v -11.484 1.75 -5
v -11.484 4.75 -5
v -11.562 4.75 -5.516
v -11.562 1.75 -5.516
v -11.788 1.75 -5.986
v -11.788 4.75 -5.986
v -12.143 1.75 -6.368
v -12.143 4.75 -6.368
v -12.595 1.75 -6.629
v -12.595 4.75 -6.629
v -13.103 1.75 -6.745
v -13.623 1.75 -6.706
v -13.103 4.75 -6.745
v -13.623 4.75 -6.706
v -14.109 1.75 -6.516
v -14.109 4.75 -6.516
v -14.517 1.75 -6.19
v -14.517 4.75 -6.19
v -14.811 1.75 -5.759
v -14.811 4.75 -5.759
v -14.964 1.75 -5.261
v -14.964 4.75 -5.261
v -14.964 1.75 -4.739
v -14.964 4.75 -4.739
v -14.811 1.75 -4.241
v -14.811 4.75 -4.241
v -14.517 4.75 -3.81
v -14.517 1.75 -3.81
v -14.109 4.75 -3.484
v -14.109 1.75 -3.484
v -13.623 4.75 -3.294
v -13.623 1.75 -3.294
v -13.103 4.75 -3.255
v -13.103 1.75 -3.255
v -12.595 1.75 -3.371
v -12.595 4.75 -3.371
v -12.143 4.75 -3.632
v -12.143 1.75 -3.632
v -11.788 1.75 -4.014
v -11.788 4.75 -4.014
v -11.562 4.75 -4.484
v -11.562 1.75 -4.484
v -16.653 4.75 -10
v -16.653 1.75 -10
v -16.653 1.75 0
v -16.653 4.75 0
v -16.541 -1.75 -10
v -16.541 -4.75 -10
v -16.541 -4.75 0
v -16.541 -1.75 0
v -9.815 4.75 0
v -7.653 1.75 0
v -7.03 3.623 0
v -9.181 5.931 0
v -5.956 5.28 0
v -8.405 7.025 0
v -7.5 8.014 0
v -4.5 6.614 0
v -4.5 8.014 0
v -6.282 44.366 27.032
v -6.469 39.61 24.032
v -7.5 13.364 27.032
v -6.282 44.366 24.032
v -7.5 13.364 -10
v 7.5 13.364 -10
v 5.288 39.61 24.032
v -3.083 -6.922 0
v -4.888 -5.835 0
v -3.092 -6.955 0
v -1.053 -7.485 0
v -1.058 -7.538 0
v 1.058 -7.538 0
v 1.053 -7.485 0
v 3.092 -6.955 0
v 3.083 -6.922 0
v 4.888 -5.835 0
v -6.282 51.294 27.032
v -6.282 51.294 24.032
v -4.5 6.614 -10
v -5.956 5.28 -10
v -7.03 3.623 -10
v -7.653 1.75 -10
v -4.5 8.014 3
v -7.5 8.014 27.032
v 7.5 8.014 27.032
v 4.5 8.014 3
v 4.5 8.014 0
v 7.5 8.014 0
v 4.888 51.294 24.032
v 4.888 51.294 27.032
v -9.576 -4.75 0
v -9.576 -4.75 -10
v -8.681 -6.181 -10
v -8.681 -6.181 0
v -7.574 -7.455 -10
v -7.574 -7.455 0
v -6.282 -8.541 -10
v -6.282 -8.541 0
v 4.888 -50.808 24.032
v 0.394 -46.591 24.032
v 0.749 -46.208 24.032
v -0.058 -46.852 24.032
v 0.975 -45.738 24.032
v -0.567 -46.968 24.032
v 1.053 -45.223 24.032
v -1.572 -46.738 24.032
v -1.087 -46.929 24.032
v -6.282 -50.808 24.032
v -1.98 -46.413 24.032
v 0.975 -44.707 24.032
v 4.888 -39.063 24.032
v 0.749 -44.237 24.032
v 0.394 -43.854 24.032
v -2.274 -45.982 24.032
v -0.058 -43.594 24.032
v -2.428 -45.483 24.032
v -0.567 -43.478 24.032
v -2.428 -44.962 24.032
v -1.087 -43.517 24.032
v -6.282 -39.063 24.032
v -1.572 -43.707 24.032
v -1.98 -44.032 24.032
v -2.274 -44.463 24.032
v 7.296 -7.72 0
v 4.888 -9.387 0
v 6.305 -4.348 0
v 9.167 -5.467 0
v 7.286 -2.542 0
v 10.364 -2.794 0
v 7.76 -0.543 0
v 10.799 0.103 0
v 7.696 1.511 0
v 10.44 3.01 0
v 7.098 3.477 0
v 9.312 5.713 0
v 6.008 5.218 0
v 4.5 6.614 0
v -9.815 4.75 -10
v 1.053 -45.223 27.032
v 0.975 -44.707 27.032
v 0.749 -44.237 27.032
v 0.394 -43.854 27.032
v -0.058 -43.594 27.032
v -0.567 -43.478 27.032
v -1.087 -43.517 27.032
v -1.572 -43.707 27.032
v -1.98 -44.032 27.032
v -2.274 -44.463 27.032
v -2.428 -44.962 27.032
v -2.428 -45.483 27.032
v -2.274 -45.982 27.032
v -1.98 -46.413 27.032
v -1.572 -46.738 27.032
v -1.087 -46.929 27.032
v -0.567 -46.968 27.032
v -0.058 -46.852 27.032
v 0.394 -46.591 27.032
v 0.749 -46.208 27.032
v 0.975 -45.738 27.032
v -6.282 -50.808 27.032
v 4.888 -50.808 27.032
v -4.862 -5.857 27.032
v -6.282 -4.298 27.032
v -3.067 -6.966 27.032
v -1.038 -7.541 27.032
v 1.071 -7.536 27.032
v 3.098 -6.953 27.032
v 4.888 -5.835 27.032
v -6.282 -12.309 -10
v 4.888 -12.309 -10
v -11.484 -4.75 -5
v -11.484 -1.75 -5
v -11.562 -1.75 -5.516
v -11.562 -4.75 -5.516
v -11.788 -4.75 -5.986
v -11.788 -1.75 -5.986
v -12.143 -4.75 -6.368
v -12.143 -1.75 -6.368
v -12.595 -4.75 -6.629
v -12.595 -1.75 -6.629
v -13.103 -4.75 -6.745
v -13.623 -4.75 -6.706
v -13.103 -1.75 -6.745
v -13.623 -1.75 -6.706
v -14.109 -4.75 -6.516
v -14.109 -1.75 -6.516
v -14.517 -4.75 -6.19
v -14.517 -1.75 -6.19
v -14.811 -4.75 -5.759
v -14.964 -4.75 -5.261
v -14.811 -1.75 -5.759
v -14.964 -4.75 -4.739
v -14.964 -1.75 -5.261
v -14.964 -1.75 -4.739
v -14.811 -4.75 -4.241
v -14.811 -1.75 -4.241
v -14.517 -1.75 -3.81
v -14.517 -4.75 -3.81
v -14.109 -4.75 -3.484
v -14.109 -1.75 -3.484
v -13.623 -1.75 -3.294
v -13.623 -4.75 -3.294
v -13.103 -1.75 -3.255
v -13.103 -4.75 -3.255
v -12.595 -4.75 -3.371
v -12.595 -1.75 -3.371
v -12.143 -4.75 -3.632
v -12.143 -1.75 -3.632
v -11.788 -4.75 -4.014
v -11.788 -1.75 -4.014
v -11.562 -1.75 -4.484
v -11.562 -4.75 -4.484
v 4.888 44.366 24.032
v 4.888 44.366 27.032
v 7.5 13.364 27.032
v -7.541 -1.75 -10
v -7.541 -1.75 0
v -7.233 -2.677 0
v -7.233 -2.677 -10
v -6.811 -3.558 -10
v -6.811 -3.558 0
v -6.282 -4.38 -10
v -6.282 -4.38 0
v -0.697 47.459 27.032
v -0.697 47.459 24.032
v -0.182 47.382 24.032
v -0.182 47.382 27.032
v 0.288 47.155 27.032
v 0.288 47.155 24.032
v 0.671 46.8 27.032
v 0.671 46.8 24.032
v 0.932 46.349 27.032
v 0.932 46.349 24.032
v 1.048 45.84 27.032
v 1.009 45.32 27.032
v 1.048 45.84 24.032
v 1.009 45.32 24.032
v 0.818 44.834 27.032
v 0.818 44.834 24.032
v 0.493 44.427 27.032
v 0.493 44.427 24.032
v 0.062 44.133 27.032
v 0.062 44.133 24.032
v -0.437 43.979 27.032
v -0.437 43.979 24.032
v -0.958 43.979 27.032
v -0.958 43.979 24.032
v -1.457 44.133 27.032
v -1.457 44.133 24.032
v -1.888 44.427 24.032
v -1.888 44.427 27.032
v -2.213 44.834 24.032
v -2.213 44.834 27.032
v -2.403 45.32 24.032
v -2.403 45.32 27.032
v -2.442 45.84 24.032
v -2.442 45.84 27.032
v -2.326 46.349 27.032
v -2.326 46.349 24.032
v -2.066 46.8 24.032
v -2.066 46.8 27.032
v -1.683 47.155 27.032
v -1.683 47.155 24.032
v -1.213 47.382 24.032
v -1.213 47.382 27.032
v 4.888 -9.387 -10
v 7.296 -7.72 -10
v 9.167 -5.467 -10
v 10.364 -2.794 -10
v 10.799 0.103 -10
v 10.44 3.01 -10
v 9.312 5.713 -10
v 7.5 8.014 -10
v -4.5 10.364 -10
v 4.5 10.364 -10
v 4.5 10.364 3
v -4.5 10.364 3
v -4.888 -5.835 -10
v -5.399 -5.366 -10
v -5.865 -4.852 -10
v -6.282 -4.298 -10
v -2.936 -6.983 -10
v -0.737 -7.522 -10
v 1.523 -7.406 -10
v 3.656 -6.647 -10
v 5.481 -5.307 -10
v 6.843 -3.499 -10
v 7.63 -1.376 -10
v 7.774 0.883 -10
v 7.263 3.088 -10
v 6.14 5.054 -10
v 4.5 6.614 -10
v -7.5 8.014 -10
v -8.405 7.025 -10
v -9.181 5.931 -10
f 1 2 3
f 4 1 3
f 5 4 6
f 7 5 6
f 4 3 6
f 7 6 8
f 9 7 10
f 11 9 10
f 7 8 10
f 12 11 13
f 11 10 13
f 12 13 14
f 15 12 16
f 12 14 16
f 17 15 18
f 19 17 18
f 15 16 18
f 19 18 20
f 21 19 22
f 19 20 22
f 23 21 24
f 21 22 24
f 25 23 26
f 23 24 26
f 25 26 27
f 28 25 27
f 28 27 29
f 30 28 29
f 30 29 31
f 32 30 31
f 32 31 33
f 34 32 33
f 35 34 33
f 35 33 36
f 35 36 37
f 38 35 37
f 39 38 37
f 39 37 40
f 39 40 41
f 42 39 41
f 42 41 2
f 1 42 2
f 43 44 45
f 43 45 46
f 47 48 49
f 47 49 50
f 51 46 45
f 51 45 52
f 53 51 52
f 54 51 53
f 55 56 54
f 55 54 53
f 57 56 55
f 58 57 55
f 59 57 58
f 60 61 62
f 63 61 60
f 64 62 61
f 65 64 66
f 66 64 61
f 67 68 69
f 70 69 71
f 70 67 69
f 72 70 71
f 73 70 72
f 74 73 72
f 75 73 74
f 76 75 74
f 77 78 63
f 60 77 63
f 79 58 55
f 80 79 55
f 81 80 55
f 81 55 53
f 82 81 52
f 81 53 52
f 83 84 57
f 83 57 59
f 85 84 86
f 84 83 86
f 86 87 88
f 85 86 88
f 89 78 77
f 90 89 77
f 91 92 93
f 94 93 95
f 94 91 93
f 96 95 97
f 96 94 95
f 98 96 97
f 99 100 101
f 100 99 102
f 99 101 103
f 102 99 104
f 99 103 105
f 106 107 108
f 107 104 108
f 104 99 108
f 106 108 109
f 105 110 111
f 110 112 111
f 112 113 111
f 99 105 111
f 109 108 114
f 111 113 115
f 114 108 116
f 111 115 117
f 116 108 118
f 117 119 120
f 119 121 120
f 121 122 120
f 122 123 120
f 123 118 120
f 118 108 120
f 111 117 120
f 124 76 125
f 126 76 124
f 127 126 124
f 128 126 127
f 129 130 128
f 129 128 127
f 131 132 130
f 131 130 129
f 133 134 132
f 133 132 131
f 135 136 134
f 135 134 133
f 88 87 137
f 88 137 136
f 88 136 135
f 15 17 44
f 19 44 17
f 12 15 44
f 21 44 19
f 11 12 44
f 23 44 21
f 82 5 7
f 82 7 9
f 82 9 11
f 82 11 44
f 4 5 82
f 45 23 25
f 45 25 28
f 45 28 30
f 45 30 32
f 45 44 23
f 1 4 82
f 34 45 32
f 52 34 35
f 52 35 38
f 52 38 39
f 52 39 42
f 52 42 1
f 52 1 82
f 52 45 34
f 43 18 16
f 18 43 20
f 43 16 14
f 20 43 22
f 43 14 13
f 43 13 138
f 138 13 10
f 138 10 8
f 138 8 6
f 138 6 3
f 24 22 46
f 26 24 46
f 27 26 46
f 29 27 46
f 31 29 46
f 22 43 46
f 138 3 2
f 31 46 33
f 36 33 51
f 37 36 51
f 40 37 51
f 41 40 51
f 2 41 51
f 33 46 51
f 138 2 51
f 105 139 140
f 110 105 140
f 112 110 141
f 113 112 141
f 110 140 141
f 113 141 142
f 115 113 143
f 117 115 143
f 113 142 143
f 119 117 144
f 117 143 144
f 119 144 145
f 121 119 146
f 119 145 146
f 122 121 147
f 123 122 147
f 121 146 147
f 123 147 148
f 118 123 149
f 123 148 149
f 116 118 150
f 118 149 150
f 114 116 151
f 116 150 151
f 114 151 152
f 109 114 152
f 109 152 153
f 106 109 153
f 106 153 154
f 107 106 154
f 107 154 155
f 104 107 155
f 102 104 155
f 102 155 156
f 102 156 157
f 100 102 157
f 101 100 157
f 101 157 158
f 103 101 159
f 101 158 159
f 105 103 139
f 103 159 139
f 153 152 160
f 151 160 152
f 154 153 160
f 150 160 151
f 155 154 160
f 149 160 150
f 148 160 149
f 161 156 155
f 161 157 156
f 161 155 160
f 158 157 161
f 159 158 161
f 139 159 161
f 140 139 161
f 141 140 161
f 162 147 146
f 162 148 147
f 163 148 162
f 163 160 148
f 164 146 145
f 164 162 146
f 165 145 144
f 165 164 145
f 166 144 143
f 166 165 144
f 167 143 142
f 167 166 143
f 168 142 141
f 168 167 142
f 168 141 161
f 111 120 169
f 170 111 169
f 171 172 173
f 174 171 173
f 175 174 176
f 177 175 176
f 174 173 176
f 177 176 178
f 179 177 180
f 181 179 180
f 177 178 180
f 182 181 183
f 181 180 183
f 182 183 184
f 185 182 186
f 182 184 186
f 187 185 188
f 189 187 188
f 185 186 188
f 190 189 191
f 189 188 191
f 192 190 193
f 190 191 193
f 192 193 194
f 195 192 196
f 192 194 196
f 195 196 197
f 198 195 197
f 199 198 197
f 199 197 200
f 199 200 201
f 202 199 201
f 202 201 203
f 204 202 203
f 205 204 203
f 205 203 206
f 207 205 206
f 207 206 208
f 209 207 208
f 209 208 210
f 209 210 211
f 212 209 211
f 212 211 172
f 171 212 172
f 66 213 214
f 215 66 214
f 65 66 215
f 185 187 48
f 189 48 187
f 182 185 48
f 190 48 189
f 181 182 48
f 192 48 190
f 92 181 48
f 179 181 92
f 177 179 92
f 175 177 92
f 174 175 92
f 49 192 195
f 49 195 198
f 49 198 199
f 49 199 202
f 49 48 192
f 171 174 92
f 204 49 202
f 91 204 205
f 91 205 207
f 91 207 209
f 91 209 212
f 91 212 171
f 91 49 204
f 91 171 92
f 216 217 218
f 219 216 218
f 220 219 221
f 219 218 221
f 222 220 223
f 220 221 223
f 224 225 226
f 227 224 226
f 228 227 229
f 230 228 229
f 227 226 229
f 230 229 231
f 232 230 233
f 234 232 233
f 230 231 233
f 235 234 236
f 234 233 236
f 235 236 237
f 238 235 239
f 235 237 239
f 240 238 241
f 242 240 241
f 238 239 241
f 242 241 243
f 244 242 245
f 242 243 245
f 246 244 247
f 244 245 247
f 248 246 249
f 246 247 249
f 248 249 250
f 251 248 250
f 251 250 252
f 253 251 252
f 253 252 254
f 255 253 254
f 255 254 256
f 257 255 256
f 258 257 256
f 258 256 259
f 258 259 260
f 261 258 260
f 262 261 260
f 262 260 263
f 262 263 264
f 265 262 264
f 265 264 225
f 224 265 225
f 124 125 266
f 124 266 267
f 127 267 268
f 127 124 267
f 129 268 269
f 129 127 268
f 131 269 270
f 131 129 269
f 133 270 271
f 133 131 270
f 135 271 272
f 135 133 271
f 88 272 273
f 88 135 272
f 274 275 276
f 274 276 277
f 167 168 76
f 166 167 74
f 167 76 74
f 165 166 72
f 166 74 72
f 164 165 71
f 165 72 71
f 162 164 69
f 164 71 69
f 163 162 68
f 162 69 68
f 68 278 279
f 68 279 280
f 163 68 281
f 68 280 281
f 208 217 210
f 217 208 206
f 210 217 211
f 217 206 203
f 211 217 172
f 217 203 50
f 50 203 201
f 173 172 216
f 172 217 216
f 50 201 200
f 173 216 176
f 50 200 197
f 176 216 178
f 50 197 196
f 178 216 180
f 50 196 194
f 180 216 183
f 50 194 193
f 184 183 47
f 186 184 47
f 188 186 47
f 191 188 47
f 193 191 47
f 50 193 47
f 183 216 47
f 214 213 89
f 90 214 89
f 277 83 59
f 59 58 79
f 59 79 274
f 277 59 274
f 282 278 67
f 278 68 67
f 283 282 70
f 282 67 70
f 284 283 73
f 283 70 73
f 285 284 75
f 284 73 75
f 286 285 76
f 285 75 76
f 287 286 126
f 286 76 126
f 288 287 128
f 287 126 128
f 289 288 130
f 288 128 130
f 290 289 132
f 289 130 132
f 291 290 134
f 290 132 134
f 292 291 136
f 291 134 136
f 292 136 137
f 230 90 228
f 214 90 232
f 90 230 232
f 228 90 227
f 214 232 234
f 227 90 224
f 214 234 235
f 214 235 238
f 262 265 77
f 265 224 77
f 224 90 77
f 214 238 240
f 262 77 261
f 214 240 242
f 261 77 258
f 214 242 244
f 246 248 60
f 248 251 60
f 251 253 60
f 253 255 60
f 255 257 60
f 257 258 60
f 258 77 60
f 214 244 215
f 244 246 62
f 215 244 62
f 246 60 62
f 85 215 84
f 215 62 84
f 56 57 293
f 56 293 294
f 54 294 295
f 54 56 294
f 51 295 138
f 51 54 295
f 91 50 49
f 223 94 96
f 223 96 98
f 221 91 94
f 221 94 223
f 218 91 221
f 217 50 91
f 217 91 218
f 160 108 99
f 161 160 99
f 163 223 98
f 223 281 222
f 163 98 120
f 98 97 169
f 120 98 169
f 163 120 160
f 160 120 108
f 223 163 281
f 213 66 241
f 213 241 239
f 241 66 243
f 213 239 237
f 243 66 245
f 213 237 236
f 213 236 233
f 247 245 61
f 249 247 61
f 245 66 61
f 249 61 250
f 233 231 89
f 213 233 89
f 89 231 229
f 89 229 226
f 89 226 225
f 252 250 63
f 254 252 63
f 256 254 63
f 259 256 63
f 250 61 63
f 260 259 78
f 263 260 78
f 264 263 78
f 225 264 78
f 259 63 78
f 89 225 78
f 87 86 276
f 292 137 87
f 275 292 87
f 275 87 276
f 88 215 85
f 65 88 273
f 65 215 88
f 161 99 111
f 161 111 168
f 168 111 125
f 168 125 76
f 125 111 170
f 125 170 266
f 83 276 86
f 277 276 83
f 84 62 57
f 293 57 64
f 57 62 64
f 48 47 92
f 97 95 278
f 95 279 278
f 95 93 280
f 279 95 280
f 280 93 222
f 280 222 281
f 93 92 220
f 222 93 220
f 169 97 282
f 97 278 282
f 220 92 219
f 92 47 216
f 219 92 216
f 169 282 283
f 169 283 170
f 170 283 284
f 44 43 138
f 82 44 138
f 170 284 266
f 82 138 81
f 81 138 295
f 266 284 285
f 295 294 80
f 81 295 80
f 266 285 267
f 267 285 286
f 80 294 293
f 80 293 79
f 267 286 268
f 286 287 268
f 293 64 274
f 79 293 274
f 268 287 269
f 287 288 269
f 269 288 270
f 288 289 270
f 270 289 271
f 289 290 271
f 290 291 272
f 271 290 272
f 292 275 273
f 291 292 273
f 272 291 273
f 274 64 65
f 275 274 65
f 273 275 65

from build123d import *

# Parameters (mm, degrees)
EXTRUDE_THIN1_DEPTH = 10
SKETCH2_W           = 17.824072676
SKETCH2_H           = 3.5
CUT_EXTRUDE1_DEPTH  = 10
SKETCH3_W           = 9
SKETCH3_H           = 3
BOSS_EXTRUDE1_DEPTH = 10
SKETCH4_R           = 1.75
CUT_EXTRUDE2_DEPTH  = 10
SKETCH5_W           = 15
SKETCH5_H           = 5.349927867
BOSS_EXTRUDE2_DEPTH = 27.0318
SKETCH6_W           = 9
SKETCH6_H           = 3.75
CUT_EXTRUDE3_DEPTH  = 13
BOSS_EXTRUDE3_DEPTH = 15
CUT_EXTRUDE8_REACH  = 67.42
SKETCH8_R           = 1.75
BOSS_EXTRUDE4_DEPTH = 37.0318
CUT_EXTRUDE6_DEPTH  = 11.169767789
SKETCH13_R          = 1.75
CUT_EXTRUDE9_DEPTH  = 3


with BuildPart() as part:
    # Sketch1 → Extrude-Thin1 (new body)
    with BuildSketch(Plane.XY):
        with BuildLine():
            Line((7.5, 8.014450411), (7.5, 13.364378278))
            Line((7.5, 13.364378278), (-7.5, 13.364378278))
            Line((-7.5, 13.364378278), (-7.5, 8.014450411))
            ThreePointArc((-7.5, 8.014450411), (0, -10.556649897), (7.5, 8.014450411))
        make_face()
        with BuildLine():
            Line((4.5, 6.614378278), (4.5, 10.364378278))
            Line((4.5, 10.364378278), (-4.5, 10.364378278))
            Line((-4.5, 10.364378278), (-4.5, 6.614378278))
            ThreePointArc((-4.5, 6.614378278), (0, -7.556649897), (4.5, 6.614378278))
        make_face(mode=Mode.SUBTRACT)
    extrude(amount=-EXTRUDE_THIN1_DEPTH)

    # Sketch2 → Cut-Extrude1 (cut)
    with BuildSketch(Plane(origin=(0, 0, -10), x_dir=(-1, 0, 0), z_dir=(0, 0, -1))):
        with Locations((8.912036338, 0)):
            Rectangle(SKETCH2_W, SKETCH2_H)
    extrude(amount=-CUT_EXTRUDE1_DEPTH, mode=Mode.SUBTRACT)

    # Sketch3 → Boss-Extrude1 (add)
    with BuildSketch(Plane.XY):
        with Locations((-12.153104343, 3.25)):
            Rectangle(SKETCH3_W, SKETCH3_H)
        with Locations((-12.04099167, -3.25)):
            Rectangle(SKETCH3_W, SKETCH3_H)
    extrude(amount=-BOSS_EXTRUDE1_DEPTH)

    # Sketch4 → Cut-Extrude2 (cut)
    with BuildSketch(Plane(origin=(0, 4.75, 0), x_dir=(1, 0, 0), z_dir=(0, 1, 0))):
        with Locations((-13.233947273, 5)):
            Circle(SKETCH4_R)
    extrude(amount=-CUT_EXTRUDE2_DEPTH, mode=Mode.SUBTRACT)

    # Sketch5 → Boss-Extrude2 (add)
    with BuildSketch(Plane.XY):
        with Locations((0, 10.689414345)):
            Rectangle(SKETCH5_W, SKETCH5_H)
    extrude(amount=BOSS_EXTRUDE2_DEPTH)

    # Sketch6 → Cut-Extrude3 (cut)
    with BuildSketch(Plane(origin=(0, 0, -10), x_dir=(-1, 0, 0), z_dir=(0, 0, -1))):
        with Locations((0, 8.489378278)):
            Rectangle(SKETCH6_W, SKETCH6_H)
    extrude(amount=-CUT_EXTRUDE3_DEPTH, mode=Mode.SUBTRACT)

    # Sketch7 → Boss-Extrude3 (add)
    with BuildSketch(Plane.ZY.offset(7.5)):
        Polygon((27.0318, 13.364378278), (-10, 13.364378278), (24.0318, 39.609893084), (24.0318, 51.294233998), (27.0318, 51.294233998), align=None)
    extrude(amount=-BOSS_EXTRUDE3_DEPTH)

    # Cut-Extrude8: up to this face of the body (flat: up to its plane)
    cut_extrude8_end = Plane(part.part.faces().sort_by_distance((0, 29.654342205, 27.0318))[0])
    # Sketch8 → Cut-Extrude8 (cut, up to the picked face)
    with BuildSketch(Plane(origin=(0, 0, -10), x_dir=(-1, 0, 0), z_dir=(0, 0, -1)), mode=Mode.PRIVATE) as cut_extrude8_sk1:
        with Locations(Location((0.697367247, 45.709350103, 0), (0, 0, 90))):
            Circle(SKETCH8_R)
    cut_extrude8_tool1 = split(extrude(cut_extrude8_sk1.sketch, amount=-CUT_EXTRUDE8_REACH, mode=Mode.PRIVATE), bisect_by=cut_extrude8_end, keep=Keep.BOTH, mode=Mode.PRIVATE)
    # Sketch8 → Cut-Extrude8 (cut, up to the picked face)
    with BuildSketch(Plane(origin=(0, 0, -10), x_dir=(-1, 0, 0), z_dir=(0, 0, -1)), mode=Mode.PRIVATE) as cut_extrude8_sk2:
        Polygon((6.282251141, 44.365676022), (6.282251141, 47.053024185), (6.282251141, 51.294233998), (7.5, 51.294233998), (7.5, 39.609893084), (7.5, 13.364378278), align=None)
    cut_extrude8_tool2 = split(extrude(cut_extrude8_sk2.sketch, amount=-CUT_EXTRUDE8_REACH, mode=Mode.PRIVATE), bisect_by=cut_extrude8_end, keep=Keep.BOTH, mode=Mode.PRIVATE)
    # Sketch8 → Cut-Extrude8 (cut, up to the picked face)
    with BuildSketch(Plane(origin=(0, 0, -10), x_dir=(-1, 0, 0), z_dir=(0, 0, -1)), mode=Mode.PRIVATE) as cut_extrude8_sk3:
        Polygon((-4.887516648, 47.053024185), (-4.887516648, 44.365676022), (-7.5, 13.364378278), (-7.5, 39.609893084), (-7.5, 51.294233998), (-4.887516648, 51.294233998), align=None)
    cut_extrude8_tool3 = split(extrude(cut_extrude8_sk3.sketch, amount=-CUT_EXTRUDE8_REACH, mode=Mode.PRIVATE), bisect_by=cut_extrude8_end, keep=Keep.BOTH, mode=Mode.PRIVATE)
    add(cut_extrude8_tool1.solids().sort_by(Axis((-0.697367, 45.70935, -10), (0, 0, 1)))[0], mode=Mode.SUBTRACT)
    add(cut_extrude8_tool2.solids().sort_by(Axis((-7.031388, 38.294234, -10), (0, 0, 1)))[0], mode=Mode.SUBTRACT)
    add(cut_extrude8_tool3.solids().sort_by(Axis((6.494669, 38.294234, -10), (0, 0, 1)))[0], mode=Mode.SUBTRACT)

    # Sketch11 → Boss-Extrude4 (add)
    with BuildSketch(Plane(origin=(0, 0, -10), x_dir=(-1, 0, 0), z_dir=(0, 0, -1))):
        with BuildLine():
            Line((6.282251141, -43.878975815), (6.282251141, -46.566323978))
            Line((6.282251141, -46.566323978), (6.282251141, -50.807533791))
            Line((6.282251141, -50.807533791), (2.041041328, -50.807533791))
            Line((2.041041328, -50.807533791), (-0.646306835, -50.807533791))
            Line((-0.646306835, -50.807533791), (-4.887516648, -50.807533791))
            Line((-4.887516648, -50.807533791), (-4.887516648, -46.566323978))
            Line((-4.887516648, -46.566323978), (-4.887516648, -43.878975815))
            Line((-4.887516648, -43.878975815), (-4.887516648, -5.83548046))
            ThreePointArc((-4.887516648, -5.83548046), (1.037871953, -7.540787293), (6.282251141, -4.298135849))
            Line((6.282251141, -4.298135849), (6.282251141, -43.878975815))
        make_face()
    extrude(amount=-BOSS_EXTRUDE4_DEPTH)

    # Sketch12 → Cut-Extrude6 (cut)
    with BuildSketch(Plane(origin=(-6.282251141, 0, 0), x_dir=(0, 0, -1), z_dir=(1, 0, 0))):
        Polygon((10, -12.309364669), (10, -50.807533791), (-24.0318, -50.807533791), (-24.0318, -39.062586463), align=None)
    extrude(amount=CUT_EXTRUDE6_DEPTH, mode=Mode.SUBTRACT)

    # Sketch13 → Cut-Extrude9 (cut)
    with BuildSketch(Plane.XY.offset(27.0318)):
        with Locations((-0.697367247, -45.222649897)):
            Circle(SKETCH13_R)
    extrude(amount=-CUT_EXTRUDE9_DEPTH, mode=Mode.SUBTRACT)


solid = part.part
